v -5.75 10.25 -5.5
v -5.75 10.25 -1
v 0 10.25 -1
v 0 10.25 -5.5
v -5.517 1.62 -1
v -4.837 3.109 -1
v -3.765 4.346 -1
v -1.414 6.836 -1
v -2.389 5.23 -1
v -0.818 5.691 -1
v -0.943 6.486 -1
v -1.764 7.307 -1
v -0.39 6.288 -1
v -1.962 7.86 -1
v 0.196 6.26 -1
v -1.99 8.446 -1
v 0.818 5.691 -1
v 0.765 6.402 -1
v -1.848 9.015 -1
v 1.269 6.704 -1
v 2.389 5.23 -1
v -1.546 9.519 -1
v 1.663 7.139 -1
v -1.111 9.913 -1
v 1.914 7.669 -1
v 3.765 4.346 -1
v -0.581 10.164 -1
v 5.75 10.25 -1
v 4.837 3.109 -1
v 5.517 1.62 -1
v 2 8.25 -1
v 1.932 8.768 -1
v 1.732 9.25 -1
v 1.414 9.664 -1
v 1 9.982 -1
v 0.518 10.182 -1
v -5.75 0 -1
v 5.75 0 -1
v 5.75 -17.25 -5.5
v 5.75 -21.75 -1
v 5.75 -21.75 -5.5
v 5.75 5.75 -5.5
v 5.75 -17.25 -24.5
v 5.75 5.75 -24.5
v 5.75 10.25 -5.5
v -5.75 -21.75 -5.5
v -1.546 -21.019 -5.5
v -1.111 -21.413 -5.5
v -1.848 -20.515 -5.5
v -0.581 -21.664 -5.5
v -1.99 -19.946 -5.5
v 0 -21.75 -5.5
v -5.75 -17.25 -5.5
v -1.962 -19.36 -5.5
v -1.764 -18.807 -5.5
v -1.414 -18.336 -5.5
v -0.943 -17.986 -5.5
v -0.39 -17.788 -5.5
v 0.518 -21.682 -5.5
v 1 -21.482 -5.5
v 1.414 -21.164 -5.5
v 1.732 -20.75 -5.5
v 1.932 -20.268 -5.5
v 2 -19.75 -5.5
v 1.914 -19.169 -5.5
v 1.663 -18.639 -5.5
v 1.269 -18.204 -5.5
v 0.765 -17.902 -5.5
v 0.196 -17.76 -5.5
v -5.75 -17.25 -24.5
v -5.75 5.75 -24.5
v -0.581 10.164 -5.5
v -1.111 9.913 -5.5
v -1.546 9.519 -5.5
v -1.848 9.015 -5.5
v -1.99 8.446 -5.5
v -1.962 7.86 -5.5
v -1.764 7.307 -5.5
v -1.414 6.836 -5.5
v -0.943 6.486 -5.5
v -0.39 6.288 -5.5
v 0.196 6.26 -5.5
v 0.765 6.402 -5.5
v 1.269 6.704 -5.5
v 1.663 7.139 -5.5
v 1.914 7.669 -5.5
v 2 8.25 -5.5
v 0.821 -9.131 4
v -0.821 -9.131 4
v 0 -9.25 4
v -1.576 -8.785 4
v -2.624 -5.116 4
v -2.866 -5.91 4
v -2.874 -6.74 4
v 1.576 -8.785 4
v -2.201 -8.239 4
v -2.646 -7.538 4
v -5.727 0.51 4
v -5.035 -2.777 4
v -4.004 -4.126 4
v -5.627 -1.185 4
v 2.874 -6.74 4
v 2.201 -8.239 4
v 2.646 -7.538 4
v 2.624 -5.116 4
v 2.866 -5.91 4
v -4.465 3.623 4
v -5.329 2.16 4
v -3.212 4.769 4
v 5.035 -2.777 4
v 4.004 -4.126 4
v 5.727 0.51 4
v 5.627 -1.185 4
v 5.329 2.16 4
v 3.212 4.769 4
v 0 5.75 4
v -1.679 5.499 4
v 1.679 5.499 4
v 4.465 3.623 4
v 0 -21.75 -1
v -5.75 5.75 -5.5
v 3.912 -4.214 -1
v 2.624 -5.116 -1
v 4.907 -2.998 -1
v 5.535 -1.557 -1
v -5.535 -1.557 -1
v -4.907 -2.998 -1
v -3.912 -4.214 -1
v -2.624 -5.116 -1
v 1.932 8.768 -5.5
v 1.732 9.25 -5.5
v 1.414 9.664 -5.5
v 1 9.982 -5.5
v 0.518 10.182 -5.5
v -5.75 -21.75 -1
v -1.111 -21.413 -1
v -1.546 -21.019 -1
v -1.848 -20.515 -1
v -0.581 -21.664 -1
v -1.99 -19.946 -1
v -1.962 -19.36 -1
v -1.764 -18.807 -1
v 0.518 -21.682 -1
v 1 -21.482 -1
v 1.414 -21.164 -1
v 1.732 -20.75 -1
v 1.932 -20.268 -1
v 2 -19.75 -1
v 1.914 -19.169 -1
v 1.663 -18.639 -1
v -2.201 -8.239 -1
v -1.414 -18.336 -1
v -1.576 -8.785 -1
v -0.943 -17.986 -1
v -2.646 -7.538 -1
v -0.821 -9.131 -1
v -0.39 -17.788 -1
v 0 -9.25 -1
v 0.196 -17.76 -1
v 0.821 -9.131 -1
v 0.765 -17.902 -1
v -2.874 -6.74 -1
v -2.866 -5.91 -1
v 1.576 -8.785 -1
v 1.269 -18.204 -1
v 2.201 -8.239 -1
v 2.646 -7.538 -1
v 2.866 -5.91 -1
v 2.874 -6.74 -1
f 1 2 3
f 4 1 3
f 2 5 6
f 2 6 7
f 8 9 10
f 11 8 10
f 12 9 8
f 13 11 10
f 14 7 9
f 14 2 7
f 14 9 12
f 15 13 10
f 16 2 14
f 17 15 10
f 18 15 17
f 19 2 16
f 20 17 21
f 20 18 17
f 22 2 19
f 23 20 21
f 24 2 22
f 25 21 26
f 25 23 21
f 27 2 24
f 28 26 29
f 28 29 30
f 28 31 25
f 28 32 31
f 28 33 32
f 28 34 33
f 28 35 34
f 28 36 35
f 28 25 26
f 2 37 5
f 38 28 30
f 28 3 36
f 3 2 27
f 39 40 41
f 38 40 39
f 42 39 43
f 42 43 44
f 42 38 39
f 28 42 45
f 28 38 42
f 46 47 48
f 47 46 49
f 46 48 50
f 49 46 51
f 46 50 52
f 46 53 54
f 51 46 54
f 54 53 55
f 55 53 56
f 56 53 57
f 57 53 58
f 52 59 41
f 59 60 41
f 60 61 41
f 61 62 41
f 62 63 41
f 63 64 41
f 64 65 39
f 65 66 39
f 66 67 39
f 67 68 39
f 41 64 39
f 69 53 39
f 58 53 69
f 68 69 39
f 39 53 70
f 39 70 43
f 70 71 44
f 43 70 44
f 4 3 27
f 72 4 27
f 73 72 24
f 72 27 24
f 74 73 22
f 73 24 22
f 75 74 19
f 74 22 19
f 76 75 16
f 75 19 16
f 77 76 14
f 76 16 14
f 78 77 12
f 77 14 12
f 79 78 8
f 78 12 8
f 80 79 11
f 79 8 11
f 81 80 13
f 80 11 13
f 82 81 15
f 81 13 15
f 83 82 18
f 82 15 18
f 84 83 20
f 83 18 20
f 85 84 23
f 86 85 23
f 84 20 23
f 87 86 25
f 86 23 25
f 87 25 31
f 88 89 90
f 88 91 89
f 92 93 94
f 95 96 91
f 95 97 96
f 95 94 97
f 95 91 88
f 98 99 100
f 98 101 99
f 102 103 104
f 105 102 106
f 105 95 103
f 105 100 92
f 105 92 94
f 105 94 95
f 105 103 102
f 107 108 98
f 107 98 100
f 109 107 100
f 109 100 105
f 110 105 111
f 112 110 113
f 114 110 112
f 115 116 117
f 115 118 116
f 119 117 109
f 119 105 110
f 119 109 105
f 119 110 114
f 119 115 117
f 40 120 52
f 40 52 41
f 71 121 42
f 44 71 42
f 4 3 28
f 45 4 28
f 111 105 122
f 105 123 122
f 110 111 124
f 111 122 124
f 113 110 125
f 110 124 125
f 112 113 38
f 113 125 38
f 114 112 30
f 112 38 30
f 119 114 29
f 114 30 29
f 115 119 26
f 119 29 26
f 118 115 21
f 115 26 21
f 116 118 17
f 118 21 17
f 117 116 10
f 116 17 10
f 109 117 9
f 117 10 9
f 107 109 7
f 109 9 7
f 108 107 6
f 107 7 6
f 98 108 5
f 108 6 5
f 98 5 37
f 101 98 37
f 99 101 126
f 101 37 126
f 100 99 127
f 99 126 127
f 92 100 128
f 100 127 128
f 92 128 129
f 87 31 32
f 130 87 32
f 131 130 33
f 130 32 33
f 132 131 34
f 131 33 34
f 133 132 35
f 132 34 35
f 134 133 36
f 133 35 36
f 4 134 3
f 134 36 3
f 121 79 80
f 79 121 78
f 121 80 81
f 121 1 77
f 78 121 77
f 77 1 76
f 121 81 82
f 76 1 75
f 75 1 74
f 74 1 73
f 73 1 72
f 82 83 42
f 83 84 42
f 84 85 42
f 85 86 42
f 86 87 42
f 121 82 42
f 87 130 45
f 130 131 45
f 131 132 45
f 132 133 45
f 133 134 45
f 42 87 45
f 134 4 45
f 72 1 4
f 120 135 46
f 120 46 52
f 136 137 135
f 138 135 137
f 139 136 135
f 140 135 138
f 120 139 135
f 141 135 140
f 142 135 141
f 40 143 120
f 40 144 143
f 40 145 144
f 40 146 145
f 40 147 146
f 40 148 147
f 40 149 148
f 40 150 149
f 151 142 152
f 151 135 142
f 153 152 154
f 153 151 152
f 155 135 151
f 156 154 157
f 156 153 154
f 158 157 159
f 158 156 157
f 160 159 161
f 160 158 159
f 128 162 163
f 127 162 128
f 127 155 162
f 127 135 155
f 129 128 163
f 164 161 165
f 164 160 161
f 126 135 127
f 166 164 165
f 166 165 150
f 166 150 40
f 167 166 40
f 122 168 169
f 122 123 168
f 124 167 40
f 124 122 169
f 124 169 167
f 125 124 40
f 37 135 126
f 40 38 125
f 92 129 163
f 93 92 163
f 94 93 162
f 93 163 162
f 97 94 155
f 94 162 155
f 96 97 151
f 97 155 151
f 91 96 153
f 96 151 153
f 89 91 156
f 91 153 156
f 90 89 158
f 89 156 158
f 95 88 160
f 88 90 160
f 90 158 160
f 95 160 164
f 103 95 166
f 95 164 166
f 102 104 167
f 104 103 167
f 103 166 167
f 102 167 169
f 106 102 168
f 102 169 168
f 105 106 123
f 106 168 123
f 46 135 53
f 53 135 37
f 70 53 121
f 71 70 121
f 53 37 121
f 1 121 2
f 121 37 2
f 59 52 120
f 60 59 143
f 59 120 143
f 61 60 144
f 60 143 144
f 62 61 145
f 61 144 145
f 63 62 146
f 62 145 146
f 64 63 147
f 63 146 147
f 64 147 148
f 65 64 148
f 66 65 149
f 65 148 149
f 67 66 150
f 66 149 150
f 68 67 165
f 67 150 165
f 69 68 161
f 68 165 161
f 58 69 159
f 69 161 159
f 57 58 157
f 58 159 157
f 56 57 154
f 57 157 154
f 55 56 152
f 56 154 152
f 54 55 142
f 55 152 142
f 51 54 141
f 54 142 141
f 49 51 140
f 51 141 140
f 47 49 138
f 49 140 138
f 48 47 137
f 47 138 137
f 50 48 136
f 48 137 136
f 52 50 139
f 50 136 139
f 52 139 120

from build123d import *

# Parameters (mm, degrees)
SKETCH_R     = 5.75
PAD_DEPTH    = 5
SKETCH001_R  = 2.9
PAD001_DEPTH = 5
SKETCH002_W  = 11.5
SKETCH002_H  = 23
PAD002_DEPTH = 23.5
SKETCH003_W  = 11.5
SKETCH003_H  = 32
PAD003_DEPTH = 4.5
SKETCH004_R  = 2
POCKET_DEPTH = 23.501


with BuildPart() as part:
    # Sketch → Pad (new body)
    with BuildSketch(Plane.XY):
        Circle(SKETCH_R)
    extrude(amount=PAD_DEPTH)

    # Sketch001 → Pad001 (join)
    with BuildSketch(Plane.XY):
        with Locations((0, -6.35)):
            Circle(SKETCH001_R)
    extrude(amount=PAD001_DEPTH)

    # Sketch002 → Pad002 (join)
    with BuildSketch(Plane.XY):
        with Locations((0, -5.75)):
            Rectangle(SKETCH002_W, SKETCH002_H)
    extrude(amount=-PAD002_DEPTH)

    # Sketch003 → Pad003 (join)
    with BuildSketch(Plane.XY):
        with Locations((0, -5.75)):
            Rectangle(SKETCH003_W, SKETCH003_H)
    extrude(amount=-PAD003_DEPTH)

    # Sketch004 → Pocket (cut, through all)
    with BuildSketch(Plane.XY):
        with Locations((0, 8.25)):
            Circle(SKETCH004_R)
        with Locations((0, -19.75)):
            Circle(SKETCH004_R)
    extrude(amount=-POCKET_DEPTH, mode=Mode.SUBTRACT)


with BuildPart() as part_1:
    # Body placement: moved
    add(part.part.moved(Location((0, 0, -1))))


solid = part_1.part
